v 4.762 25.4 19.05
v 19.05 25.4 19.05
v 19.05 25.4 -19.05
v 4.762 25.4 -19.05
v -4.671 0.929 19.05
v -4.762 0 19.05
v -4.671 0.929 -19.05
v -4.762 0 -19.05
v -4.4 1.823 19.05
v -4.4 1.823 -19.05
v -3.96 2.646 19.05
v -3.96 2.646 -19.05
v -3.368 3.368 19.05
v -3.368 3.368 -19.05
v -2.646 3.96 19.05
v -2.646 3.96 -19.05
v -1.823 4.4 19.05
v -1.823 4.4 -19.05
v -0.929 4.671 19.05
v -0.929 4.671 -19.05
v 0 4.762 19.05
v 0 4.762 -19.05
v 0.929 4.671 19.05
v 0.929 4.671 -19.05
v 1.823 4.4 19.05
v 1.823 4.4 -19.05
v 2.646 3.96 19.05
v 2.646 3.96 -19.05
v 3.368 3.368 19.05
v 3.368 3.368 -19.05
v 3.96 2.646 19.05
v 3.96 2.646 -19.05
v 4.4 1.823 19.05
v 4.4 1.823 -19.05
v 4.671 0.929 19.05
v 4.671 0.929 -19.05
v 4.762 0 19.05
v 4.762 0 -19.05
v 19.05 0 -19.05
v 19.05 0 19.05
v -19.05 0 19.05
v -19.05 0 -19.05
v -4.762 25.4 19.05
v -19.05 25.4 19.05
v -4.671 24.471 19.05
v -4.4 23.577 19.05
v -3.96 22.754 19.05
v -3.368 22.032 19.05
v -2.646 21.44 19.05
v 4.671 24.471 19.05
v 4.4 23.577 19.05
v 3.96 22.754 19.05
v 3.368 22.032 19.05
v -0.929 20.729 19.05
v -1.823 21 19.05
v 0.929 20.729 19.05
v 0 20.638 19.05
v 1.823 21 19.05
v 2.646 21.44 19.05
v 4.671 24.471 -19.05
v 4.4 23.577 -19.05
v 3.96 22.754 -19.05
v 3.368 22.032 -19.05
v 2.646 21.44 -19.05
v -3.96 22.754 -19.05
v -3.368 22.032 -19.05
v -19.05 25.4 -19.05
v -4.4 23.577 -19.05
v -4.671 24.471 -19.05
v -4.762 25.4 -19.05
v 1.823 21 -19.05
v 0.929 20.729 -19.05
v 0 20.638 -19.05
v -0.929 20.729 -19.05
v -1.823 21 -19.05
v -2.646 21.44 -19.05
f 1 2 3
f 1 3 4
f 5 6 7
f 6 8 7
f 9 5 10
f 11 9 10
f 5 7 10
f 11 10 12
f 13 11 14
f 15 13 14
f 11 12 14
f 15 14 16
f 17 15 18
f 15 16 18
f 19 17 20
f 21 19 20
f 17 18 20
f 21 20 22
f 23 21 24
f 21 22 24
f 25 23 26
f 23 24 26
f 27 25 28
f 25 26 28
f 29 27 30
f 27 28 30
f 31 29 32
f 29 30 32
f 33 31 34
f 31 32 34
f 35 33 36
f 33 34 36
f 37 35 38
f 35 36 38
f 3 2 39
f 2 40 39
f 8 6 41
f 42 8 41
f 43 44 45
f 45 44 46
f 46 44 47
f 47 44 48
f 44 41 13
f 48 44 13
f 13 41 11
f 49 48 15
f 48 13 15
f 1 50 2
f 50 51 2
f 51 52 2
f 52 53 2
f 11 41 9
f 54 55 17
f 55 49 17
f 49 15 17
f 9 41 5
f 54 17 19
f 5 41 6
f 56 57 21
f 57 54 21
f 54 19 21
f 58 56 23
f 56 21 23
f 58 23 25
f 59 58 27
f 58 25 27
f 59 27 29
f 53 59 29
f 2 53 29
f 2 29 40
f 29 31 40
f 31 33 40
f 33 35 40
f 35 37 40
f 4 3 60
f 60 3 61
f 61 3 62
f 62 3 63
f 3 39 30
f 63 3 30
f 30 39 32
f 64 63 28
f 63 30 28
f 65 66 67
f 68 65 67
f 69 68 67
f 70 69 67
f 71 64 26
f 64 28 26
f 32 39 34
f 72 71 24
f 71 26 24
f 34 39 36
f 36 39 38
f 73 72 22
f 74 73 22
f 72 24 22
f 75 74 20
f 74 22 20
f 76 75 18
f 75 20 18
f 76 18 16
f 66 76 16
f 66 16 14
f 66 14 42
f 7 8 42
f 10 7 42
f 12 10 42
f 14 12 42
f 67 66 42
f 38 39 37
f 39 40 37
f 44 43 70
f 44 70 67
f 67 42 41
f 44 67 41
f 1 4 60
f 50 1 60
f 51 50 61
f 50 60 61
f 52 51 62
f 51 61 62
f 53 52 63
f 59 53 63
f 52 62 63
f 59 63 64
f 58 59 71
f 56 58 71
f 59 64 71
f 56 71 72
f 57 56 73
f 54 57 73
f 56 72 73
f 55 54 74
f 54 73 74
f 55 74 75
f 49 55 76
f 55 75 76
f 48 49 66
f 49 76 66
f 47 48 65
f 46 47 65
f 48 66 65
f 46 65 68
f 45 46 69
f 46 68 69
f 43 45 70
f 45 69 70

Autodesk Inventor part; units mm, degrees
ref_plane "YZ Plane" through (0, 0, 0) normal (1, 0, 0) x (0, 1, 0)
ref_plane "XZ Plane" through (0, 0, 0) normal (0, 1, 0) x (-1, 0, 0)
ref_plane "XY Plane" through (0, 0, 0) normal (0, 0, 1) x (1, 0, 0)
sketch "Sketch1" plane through (0, 0, 0) normal (0, 1, 0) x (-1, 0, 0)
  line L0 (-19.05, 19.05) -> (-19.05, -19.05)
  line L1 (-19.05, -19.05) -> (19.05, -19.05)
  line L2 (19.05, -19.05) -> (19.05, 19.05)
  line L3 (19.05, 19.05) -> (-19.05, 19.05)
  line L4 (-19.05, 19.05) -> (19.05, -19.05) construction
  line L5 (-19.05, -19.05) -> (19.05, 19.05) construction
  point P0 (0, 0)
  dimension "d4" = 38.1
extrude "Extrusion1" add sketch "Sketch1" along normal blind 25.4
sketch "Sketch3" plane through (-19.05, 0, 19.05) normal (0, 0, 1) x (1, 0, 0)
  line L0 (38.1, 25.4) -> (0, 25.4) construction
  point P0 (19.05, 0)
  point P1 (19.05, 25.4)
  point P2 (19.05, 0)
hole "Hole1" at (0, 25.4, 19.05) at (0, 0, 19.05) direction (0, 0, -1) diameter 9.525 end through all
equation "\"d4\" = width"
equation "\"d6\" = deltaBottomToTop"
equation "\"d9\" = bottomHoleDiam"
equation "\"bottomHoleDiam\" = 9.525"
equation "\"width\" = 38.1"
equation "\"deltaBottomToTop\" = 25.4"
equation "\"d0\" = width"
equation "\"d1\" = heightOfBottomHole"
equation "\"d2\" = 0"
equation "\"d3\" = bottomHoleDiam"
equation "\"d5\" = 0"
equation "\"height\" = deltaBottomToTop + heightOfBottomHole + heightOfTopHole"
equation "\"heightOfBottomHole\" = 11.1125"
equation "\"heightOfTopHole\" = 11.1125"
properties part number "MiddleOfSquareSupport"
